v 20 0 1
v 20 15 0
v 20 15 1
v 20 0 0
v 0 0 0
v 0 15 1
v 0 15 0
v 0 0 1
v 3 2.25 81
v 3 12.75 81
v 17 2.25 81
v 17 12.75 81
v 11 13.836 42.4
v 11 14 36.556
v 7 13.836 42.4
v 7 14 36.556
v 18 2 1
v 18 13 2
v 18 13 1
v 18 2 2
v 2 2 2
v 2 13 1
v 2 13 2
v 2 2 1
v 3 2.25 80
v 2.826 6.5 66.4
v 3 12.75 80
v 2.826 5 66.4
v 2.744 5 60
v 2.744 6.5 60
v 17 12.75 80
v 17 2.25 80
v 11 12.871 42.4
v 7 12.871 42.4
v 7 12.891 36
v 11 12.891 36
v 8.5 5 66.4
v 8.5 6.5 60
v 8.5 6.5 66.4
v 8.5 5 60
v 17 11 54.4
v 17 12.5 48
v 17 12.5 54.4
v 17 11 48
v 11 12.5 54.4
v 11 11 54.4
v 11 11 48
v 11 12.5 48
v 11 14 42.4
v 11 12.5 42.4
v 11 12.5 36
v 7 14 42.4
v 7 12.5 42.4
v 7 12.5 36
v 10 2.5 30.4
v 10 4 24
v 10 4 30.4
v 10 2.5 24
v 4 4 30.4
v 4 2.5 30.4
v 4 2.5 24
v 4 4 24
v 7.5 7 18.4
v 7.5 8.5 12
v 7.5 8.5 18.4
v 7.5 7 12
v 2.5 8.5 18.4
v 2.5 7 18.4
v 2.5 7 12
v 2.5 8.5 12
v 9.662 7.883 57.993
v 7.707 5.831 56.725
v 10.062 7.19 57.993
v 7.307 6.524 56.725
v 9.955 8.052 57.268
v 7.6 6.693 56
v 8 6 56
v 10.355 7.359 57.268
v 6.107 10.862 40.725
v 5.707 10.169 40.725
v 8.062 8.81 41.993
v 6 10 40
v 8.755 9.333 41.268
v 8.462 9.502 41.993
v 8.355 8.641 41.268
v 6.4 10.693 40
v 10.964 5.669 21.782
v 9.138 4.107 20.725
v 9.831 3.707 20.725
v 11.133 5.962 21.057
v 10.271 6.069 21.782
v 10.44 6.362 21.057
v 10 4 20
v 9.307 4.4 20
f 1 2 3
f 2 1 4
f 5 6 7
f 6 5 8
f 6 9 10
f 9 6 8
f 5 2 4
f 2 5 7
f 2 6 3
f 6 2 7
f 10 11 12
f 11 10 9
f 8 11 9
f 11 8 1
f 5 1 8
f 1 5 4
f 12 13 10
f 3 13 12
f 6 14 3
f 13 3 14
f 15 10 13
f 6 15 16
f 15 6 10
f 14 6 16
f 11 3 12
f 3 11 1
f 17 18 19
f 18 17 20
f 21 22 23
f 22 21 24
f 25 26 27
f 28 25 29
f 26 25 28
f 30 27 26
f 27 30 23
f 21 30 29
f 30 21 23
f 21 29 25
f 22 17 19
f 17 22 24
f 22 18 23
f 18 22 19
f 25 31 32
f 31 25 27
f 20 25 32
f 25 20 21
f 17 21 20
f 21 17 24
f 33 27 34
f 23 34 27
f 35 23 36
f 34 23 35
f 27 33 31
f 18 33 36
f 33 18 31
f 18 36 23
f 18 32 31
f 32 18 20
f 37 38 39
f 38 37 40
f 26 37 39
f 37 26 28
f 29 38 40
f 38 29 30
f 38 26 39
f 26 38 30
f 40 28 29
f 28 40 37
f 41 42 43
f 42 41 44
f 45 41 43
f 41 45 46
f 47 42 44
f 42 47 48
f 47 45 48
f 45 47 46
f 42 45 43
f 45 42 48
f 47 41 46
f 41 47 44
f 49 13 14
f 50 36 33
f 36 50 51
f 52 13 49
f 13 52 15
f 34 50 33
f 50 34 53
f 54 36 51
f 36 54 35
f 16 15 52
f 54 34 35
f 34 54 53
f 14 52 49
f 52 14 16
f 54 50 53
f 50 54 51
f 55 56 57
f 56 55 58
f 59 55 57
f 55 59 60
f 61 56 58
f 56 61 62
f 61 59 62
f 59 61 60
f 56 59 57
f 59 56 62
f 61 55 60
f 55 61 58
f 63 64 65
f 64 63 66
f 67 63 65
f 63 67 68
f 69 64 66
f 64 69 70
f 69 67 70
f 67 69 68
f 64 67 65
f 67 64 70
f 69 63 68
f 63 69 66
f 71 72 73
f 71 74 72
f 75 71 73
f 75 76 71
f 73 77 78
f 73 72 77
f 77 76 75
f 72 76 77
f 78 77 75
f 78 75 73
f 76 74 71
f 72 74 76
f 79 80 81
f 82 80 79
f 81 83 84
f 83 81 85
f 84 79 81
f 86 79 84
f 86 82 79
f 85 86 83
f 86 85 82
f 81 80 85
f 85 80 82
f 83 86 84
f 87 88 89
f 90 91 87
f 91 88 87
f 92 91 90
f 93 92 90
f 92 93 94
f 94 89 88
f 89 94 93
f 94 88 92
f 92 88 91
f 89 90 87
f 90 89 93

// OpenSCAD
// Fantasy Spell Tracker - OpenSCAD Model
// Breaking down the components step by step

// === PARAMETERS ===
// Main dimensions (we'll refine these as we go)
base_width = 60;
base_depth = 40;
base_height = 8;

tower_width = 20;
tower_depth = 15;
tower_height = 80;

card_slot_width = 12;
card_slot_height = 16;
card_slot_depth = 2;

// === MODULE DEFINITIONS ===

// Base platform with stone texture
module base_platform() {
    difference() {
        // Main base
        cube([base_width, base_depth, base_height]);
        
        // Add some simple stone texture later
        // For now, just create the basic shape
    }
}

// Main tower structure with dice tower ramps
module main_tower() {
    difference() {
        // Outer tapered tower shell
        hull() {
            // Bottom - full size
            cube([tower_width, tower_depth, 1]);
            
            // Top - smaller size for taper
            translate([tower_width * 0.15, tower_depth * 0.15, tower_height])
                cube([tower_width * 0.7, tower_depth * 0.7, 1]);
        }
        
        // Hollow interior for dice path
        translate([2, 2, 1])
            hull() {
                // Bottom interior
                cube([tower_width - 4, tower_depth - 4, 1]);
                
                // Top interior (smaller)
                translate([tower_width * 0.15 - 2, tower_depth * 0.15 - 2, tower_height - 2])
                    cube([tower_width * 0.7 - 0, tower_depth * 0.7 - 0, 1]);
            }
    }
    
    // Internal baffles for dice bouncing - properly contained within tower walls
    // All elements guaranteed to be inside the hollow interior
    
    // Baffle 1 - Left wall step (properly sized and positioned)
    translate([2.5, 5, tower_height * 0.75])
        cube([6, 1.5, tower_height * 0.08]);
    
    // Baffle 2 - Right wall step (properly sized and positioned)  
    translate([11, tower_depth - 4, tower_height * 0.6])
        cube([6, 1.5, tower_height * 0.08]);
    
    // Baffle 3 - Back wall step (properly sized and positioned)
    translate([7, tower_depth - 2.5, tower_height * 0.45])
        cube([4, 1.5, tower_height * 0.08]);
    
    // Baffle 4 - Front wall step (properly sized and positioned)
    translate([4, 2.5, tower_height * 0.3])
        cube([6, 1.5, tower_height * 0.08]);
    
    // Baffle 5 - Left wall step (properly sized and positioned)
    translate([2.5, 7, tower_height * 0.15])
        cube([5, 1.5, tower_height * 0.08]);
    
    // Small deflector ramps - carefully positioned inside walls
    // Ramp 1 - gentle slope, well within bounds
    translate([8, 6, tower_height * 0.7])
        rotate([0, -25, 30])
            cube([3, 0.8, 0.8]);
    
    // Ramp 2 - gentle slope, well within bounds
    translate([6, tower_depth - 5, tower_height * 0.5])
        rotate([0, -25, -30])
            cube([3, 0.8, 0.8]);
    
    // Ramp 3 - gentle slope, well within bounds
    translate([10, 4, tower_height * 0.25])
        rotate([0, -25, 60])
            cube([2.5, 0.8, 0.8]);
}

// Individual card slot holders (the modular pieces on the right)
module card_slot_holder() {
    difference() {
        // Outer frame
        cube([card_slot_width + 4, card_slot_height + 4, 4]);
        
        // Card slot cutout
        translate([2, 2, 1])
            cube([card_slot_width, card_slot_height, 3]);
    }
}

// === ASSEMBLY ===
module spell_tracker_v1() {
    // Base platform - COMMENTED OUT FOR TOWER FOCUS
    // base_platform();
    
    // Main tower positioned on the base
    // translate([5, base_depth/2 - tower_depth/2, base_height])
        main_tower();
    
    // Card holders - COMMENTED OUT FOR TOWER FOCUS
    // for (i = [0:5]) {
    //     translate([tower_width + 15, base_depth/2 - card_slot_height/2, base_height + (i * 18)])
    //         card_slot_holder();
    // }
}

// === RENDER ===
spell_tracker_v1();

// === NOTES FOR NEXT ITERATIONS ===
/*
TODO for future versions:
1. Add ornate details to the main tower (the blue decorative elements)
2. Create stone texture on the base
3. Add the pointed/pyramid top
4. Model the individual card icons/symbols
5. Add connection mechanisms between card holders
6. Refine dimensions based on actual measurements needed
7. Add the decorative border around the base
*/
